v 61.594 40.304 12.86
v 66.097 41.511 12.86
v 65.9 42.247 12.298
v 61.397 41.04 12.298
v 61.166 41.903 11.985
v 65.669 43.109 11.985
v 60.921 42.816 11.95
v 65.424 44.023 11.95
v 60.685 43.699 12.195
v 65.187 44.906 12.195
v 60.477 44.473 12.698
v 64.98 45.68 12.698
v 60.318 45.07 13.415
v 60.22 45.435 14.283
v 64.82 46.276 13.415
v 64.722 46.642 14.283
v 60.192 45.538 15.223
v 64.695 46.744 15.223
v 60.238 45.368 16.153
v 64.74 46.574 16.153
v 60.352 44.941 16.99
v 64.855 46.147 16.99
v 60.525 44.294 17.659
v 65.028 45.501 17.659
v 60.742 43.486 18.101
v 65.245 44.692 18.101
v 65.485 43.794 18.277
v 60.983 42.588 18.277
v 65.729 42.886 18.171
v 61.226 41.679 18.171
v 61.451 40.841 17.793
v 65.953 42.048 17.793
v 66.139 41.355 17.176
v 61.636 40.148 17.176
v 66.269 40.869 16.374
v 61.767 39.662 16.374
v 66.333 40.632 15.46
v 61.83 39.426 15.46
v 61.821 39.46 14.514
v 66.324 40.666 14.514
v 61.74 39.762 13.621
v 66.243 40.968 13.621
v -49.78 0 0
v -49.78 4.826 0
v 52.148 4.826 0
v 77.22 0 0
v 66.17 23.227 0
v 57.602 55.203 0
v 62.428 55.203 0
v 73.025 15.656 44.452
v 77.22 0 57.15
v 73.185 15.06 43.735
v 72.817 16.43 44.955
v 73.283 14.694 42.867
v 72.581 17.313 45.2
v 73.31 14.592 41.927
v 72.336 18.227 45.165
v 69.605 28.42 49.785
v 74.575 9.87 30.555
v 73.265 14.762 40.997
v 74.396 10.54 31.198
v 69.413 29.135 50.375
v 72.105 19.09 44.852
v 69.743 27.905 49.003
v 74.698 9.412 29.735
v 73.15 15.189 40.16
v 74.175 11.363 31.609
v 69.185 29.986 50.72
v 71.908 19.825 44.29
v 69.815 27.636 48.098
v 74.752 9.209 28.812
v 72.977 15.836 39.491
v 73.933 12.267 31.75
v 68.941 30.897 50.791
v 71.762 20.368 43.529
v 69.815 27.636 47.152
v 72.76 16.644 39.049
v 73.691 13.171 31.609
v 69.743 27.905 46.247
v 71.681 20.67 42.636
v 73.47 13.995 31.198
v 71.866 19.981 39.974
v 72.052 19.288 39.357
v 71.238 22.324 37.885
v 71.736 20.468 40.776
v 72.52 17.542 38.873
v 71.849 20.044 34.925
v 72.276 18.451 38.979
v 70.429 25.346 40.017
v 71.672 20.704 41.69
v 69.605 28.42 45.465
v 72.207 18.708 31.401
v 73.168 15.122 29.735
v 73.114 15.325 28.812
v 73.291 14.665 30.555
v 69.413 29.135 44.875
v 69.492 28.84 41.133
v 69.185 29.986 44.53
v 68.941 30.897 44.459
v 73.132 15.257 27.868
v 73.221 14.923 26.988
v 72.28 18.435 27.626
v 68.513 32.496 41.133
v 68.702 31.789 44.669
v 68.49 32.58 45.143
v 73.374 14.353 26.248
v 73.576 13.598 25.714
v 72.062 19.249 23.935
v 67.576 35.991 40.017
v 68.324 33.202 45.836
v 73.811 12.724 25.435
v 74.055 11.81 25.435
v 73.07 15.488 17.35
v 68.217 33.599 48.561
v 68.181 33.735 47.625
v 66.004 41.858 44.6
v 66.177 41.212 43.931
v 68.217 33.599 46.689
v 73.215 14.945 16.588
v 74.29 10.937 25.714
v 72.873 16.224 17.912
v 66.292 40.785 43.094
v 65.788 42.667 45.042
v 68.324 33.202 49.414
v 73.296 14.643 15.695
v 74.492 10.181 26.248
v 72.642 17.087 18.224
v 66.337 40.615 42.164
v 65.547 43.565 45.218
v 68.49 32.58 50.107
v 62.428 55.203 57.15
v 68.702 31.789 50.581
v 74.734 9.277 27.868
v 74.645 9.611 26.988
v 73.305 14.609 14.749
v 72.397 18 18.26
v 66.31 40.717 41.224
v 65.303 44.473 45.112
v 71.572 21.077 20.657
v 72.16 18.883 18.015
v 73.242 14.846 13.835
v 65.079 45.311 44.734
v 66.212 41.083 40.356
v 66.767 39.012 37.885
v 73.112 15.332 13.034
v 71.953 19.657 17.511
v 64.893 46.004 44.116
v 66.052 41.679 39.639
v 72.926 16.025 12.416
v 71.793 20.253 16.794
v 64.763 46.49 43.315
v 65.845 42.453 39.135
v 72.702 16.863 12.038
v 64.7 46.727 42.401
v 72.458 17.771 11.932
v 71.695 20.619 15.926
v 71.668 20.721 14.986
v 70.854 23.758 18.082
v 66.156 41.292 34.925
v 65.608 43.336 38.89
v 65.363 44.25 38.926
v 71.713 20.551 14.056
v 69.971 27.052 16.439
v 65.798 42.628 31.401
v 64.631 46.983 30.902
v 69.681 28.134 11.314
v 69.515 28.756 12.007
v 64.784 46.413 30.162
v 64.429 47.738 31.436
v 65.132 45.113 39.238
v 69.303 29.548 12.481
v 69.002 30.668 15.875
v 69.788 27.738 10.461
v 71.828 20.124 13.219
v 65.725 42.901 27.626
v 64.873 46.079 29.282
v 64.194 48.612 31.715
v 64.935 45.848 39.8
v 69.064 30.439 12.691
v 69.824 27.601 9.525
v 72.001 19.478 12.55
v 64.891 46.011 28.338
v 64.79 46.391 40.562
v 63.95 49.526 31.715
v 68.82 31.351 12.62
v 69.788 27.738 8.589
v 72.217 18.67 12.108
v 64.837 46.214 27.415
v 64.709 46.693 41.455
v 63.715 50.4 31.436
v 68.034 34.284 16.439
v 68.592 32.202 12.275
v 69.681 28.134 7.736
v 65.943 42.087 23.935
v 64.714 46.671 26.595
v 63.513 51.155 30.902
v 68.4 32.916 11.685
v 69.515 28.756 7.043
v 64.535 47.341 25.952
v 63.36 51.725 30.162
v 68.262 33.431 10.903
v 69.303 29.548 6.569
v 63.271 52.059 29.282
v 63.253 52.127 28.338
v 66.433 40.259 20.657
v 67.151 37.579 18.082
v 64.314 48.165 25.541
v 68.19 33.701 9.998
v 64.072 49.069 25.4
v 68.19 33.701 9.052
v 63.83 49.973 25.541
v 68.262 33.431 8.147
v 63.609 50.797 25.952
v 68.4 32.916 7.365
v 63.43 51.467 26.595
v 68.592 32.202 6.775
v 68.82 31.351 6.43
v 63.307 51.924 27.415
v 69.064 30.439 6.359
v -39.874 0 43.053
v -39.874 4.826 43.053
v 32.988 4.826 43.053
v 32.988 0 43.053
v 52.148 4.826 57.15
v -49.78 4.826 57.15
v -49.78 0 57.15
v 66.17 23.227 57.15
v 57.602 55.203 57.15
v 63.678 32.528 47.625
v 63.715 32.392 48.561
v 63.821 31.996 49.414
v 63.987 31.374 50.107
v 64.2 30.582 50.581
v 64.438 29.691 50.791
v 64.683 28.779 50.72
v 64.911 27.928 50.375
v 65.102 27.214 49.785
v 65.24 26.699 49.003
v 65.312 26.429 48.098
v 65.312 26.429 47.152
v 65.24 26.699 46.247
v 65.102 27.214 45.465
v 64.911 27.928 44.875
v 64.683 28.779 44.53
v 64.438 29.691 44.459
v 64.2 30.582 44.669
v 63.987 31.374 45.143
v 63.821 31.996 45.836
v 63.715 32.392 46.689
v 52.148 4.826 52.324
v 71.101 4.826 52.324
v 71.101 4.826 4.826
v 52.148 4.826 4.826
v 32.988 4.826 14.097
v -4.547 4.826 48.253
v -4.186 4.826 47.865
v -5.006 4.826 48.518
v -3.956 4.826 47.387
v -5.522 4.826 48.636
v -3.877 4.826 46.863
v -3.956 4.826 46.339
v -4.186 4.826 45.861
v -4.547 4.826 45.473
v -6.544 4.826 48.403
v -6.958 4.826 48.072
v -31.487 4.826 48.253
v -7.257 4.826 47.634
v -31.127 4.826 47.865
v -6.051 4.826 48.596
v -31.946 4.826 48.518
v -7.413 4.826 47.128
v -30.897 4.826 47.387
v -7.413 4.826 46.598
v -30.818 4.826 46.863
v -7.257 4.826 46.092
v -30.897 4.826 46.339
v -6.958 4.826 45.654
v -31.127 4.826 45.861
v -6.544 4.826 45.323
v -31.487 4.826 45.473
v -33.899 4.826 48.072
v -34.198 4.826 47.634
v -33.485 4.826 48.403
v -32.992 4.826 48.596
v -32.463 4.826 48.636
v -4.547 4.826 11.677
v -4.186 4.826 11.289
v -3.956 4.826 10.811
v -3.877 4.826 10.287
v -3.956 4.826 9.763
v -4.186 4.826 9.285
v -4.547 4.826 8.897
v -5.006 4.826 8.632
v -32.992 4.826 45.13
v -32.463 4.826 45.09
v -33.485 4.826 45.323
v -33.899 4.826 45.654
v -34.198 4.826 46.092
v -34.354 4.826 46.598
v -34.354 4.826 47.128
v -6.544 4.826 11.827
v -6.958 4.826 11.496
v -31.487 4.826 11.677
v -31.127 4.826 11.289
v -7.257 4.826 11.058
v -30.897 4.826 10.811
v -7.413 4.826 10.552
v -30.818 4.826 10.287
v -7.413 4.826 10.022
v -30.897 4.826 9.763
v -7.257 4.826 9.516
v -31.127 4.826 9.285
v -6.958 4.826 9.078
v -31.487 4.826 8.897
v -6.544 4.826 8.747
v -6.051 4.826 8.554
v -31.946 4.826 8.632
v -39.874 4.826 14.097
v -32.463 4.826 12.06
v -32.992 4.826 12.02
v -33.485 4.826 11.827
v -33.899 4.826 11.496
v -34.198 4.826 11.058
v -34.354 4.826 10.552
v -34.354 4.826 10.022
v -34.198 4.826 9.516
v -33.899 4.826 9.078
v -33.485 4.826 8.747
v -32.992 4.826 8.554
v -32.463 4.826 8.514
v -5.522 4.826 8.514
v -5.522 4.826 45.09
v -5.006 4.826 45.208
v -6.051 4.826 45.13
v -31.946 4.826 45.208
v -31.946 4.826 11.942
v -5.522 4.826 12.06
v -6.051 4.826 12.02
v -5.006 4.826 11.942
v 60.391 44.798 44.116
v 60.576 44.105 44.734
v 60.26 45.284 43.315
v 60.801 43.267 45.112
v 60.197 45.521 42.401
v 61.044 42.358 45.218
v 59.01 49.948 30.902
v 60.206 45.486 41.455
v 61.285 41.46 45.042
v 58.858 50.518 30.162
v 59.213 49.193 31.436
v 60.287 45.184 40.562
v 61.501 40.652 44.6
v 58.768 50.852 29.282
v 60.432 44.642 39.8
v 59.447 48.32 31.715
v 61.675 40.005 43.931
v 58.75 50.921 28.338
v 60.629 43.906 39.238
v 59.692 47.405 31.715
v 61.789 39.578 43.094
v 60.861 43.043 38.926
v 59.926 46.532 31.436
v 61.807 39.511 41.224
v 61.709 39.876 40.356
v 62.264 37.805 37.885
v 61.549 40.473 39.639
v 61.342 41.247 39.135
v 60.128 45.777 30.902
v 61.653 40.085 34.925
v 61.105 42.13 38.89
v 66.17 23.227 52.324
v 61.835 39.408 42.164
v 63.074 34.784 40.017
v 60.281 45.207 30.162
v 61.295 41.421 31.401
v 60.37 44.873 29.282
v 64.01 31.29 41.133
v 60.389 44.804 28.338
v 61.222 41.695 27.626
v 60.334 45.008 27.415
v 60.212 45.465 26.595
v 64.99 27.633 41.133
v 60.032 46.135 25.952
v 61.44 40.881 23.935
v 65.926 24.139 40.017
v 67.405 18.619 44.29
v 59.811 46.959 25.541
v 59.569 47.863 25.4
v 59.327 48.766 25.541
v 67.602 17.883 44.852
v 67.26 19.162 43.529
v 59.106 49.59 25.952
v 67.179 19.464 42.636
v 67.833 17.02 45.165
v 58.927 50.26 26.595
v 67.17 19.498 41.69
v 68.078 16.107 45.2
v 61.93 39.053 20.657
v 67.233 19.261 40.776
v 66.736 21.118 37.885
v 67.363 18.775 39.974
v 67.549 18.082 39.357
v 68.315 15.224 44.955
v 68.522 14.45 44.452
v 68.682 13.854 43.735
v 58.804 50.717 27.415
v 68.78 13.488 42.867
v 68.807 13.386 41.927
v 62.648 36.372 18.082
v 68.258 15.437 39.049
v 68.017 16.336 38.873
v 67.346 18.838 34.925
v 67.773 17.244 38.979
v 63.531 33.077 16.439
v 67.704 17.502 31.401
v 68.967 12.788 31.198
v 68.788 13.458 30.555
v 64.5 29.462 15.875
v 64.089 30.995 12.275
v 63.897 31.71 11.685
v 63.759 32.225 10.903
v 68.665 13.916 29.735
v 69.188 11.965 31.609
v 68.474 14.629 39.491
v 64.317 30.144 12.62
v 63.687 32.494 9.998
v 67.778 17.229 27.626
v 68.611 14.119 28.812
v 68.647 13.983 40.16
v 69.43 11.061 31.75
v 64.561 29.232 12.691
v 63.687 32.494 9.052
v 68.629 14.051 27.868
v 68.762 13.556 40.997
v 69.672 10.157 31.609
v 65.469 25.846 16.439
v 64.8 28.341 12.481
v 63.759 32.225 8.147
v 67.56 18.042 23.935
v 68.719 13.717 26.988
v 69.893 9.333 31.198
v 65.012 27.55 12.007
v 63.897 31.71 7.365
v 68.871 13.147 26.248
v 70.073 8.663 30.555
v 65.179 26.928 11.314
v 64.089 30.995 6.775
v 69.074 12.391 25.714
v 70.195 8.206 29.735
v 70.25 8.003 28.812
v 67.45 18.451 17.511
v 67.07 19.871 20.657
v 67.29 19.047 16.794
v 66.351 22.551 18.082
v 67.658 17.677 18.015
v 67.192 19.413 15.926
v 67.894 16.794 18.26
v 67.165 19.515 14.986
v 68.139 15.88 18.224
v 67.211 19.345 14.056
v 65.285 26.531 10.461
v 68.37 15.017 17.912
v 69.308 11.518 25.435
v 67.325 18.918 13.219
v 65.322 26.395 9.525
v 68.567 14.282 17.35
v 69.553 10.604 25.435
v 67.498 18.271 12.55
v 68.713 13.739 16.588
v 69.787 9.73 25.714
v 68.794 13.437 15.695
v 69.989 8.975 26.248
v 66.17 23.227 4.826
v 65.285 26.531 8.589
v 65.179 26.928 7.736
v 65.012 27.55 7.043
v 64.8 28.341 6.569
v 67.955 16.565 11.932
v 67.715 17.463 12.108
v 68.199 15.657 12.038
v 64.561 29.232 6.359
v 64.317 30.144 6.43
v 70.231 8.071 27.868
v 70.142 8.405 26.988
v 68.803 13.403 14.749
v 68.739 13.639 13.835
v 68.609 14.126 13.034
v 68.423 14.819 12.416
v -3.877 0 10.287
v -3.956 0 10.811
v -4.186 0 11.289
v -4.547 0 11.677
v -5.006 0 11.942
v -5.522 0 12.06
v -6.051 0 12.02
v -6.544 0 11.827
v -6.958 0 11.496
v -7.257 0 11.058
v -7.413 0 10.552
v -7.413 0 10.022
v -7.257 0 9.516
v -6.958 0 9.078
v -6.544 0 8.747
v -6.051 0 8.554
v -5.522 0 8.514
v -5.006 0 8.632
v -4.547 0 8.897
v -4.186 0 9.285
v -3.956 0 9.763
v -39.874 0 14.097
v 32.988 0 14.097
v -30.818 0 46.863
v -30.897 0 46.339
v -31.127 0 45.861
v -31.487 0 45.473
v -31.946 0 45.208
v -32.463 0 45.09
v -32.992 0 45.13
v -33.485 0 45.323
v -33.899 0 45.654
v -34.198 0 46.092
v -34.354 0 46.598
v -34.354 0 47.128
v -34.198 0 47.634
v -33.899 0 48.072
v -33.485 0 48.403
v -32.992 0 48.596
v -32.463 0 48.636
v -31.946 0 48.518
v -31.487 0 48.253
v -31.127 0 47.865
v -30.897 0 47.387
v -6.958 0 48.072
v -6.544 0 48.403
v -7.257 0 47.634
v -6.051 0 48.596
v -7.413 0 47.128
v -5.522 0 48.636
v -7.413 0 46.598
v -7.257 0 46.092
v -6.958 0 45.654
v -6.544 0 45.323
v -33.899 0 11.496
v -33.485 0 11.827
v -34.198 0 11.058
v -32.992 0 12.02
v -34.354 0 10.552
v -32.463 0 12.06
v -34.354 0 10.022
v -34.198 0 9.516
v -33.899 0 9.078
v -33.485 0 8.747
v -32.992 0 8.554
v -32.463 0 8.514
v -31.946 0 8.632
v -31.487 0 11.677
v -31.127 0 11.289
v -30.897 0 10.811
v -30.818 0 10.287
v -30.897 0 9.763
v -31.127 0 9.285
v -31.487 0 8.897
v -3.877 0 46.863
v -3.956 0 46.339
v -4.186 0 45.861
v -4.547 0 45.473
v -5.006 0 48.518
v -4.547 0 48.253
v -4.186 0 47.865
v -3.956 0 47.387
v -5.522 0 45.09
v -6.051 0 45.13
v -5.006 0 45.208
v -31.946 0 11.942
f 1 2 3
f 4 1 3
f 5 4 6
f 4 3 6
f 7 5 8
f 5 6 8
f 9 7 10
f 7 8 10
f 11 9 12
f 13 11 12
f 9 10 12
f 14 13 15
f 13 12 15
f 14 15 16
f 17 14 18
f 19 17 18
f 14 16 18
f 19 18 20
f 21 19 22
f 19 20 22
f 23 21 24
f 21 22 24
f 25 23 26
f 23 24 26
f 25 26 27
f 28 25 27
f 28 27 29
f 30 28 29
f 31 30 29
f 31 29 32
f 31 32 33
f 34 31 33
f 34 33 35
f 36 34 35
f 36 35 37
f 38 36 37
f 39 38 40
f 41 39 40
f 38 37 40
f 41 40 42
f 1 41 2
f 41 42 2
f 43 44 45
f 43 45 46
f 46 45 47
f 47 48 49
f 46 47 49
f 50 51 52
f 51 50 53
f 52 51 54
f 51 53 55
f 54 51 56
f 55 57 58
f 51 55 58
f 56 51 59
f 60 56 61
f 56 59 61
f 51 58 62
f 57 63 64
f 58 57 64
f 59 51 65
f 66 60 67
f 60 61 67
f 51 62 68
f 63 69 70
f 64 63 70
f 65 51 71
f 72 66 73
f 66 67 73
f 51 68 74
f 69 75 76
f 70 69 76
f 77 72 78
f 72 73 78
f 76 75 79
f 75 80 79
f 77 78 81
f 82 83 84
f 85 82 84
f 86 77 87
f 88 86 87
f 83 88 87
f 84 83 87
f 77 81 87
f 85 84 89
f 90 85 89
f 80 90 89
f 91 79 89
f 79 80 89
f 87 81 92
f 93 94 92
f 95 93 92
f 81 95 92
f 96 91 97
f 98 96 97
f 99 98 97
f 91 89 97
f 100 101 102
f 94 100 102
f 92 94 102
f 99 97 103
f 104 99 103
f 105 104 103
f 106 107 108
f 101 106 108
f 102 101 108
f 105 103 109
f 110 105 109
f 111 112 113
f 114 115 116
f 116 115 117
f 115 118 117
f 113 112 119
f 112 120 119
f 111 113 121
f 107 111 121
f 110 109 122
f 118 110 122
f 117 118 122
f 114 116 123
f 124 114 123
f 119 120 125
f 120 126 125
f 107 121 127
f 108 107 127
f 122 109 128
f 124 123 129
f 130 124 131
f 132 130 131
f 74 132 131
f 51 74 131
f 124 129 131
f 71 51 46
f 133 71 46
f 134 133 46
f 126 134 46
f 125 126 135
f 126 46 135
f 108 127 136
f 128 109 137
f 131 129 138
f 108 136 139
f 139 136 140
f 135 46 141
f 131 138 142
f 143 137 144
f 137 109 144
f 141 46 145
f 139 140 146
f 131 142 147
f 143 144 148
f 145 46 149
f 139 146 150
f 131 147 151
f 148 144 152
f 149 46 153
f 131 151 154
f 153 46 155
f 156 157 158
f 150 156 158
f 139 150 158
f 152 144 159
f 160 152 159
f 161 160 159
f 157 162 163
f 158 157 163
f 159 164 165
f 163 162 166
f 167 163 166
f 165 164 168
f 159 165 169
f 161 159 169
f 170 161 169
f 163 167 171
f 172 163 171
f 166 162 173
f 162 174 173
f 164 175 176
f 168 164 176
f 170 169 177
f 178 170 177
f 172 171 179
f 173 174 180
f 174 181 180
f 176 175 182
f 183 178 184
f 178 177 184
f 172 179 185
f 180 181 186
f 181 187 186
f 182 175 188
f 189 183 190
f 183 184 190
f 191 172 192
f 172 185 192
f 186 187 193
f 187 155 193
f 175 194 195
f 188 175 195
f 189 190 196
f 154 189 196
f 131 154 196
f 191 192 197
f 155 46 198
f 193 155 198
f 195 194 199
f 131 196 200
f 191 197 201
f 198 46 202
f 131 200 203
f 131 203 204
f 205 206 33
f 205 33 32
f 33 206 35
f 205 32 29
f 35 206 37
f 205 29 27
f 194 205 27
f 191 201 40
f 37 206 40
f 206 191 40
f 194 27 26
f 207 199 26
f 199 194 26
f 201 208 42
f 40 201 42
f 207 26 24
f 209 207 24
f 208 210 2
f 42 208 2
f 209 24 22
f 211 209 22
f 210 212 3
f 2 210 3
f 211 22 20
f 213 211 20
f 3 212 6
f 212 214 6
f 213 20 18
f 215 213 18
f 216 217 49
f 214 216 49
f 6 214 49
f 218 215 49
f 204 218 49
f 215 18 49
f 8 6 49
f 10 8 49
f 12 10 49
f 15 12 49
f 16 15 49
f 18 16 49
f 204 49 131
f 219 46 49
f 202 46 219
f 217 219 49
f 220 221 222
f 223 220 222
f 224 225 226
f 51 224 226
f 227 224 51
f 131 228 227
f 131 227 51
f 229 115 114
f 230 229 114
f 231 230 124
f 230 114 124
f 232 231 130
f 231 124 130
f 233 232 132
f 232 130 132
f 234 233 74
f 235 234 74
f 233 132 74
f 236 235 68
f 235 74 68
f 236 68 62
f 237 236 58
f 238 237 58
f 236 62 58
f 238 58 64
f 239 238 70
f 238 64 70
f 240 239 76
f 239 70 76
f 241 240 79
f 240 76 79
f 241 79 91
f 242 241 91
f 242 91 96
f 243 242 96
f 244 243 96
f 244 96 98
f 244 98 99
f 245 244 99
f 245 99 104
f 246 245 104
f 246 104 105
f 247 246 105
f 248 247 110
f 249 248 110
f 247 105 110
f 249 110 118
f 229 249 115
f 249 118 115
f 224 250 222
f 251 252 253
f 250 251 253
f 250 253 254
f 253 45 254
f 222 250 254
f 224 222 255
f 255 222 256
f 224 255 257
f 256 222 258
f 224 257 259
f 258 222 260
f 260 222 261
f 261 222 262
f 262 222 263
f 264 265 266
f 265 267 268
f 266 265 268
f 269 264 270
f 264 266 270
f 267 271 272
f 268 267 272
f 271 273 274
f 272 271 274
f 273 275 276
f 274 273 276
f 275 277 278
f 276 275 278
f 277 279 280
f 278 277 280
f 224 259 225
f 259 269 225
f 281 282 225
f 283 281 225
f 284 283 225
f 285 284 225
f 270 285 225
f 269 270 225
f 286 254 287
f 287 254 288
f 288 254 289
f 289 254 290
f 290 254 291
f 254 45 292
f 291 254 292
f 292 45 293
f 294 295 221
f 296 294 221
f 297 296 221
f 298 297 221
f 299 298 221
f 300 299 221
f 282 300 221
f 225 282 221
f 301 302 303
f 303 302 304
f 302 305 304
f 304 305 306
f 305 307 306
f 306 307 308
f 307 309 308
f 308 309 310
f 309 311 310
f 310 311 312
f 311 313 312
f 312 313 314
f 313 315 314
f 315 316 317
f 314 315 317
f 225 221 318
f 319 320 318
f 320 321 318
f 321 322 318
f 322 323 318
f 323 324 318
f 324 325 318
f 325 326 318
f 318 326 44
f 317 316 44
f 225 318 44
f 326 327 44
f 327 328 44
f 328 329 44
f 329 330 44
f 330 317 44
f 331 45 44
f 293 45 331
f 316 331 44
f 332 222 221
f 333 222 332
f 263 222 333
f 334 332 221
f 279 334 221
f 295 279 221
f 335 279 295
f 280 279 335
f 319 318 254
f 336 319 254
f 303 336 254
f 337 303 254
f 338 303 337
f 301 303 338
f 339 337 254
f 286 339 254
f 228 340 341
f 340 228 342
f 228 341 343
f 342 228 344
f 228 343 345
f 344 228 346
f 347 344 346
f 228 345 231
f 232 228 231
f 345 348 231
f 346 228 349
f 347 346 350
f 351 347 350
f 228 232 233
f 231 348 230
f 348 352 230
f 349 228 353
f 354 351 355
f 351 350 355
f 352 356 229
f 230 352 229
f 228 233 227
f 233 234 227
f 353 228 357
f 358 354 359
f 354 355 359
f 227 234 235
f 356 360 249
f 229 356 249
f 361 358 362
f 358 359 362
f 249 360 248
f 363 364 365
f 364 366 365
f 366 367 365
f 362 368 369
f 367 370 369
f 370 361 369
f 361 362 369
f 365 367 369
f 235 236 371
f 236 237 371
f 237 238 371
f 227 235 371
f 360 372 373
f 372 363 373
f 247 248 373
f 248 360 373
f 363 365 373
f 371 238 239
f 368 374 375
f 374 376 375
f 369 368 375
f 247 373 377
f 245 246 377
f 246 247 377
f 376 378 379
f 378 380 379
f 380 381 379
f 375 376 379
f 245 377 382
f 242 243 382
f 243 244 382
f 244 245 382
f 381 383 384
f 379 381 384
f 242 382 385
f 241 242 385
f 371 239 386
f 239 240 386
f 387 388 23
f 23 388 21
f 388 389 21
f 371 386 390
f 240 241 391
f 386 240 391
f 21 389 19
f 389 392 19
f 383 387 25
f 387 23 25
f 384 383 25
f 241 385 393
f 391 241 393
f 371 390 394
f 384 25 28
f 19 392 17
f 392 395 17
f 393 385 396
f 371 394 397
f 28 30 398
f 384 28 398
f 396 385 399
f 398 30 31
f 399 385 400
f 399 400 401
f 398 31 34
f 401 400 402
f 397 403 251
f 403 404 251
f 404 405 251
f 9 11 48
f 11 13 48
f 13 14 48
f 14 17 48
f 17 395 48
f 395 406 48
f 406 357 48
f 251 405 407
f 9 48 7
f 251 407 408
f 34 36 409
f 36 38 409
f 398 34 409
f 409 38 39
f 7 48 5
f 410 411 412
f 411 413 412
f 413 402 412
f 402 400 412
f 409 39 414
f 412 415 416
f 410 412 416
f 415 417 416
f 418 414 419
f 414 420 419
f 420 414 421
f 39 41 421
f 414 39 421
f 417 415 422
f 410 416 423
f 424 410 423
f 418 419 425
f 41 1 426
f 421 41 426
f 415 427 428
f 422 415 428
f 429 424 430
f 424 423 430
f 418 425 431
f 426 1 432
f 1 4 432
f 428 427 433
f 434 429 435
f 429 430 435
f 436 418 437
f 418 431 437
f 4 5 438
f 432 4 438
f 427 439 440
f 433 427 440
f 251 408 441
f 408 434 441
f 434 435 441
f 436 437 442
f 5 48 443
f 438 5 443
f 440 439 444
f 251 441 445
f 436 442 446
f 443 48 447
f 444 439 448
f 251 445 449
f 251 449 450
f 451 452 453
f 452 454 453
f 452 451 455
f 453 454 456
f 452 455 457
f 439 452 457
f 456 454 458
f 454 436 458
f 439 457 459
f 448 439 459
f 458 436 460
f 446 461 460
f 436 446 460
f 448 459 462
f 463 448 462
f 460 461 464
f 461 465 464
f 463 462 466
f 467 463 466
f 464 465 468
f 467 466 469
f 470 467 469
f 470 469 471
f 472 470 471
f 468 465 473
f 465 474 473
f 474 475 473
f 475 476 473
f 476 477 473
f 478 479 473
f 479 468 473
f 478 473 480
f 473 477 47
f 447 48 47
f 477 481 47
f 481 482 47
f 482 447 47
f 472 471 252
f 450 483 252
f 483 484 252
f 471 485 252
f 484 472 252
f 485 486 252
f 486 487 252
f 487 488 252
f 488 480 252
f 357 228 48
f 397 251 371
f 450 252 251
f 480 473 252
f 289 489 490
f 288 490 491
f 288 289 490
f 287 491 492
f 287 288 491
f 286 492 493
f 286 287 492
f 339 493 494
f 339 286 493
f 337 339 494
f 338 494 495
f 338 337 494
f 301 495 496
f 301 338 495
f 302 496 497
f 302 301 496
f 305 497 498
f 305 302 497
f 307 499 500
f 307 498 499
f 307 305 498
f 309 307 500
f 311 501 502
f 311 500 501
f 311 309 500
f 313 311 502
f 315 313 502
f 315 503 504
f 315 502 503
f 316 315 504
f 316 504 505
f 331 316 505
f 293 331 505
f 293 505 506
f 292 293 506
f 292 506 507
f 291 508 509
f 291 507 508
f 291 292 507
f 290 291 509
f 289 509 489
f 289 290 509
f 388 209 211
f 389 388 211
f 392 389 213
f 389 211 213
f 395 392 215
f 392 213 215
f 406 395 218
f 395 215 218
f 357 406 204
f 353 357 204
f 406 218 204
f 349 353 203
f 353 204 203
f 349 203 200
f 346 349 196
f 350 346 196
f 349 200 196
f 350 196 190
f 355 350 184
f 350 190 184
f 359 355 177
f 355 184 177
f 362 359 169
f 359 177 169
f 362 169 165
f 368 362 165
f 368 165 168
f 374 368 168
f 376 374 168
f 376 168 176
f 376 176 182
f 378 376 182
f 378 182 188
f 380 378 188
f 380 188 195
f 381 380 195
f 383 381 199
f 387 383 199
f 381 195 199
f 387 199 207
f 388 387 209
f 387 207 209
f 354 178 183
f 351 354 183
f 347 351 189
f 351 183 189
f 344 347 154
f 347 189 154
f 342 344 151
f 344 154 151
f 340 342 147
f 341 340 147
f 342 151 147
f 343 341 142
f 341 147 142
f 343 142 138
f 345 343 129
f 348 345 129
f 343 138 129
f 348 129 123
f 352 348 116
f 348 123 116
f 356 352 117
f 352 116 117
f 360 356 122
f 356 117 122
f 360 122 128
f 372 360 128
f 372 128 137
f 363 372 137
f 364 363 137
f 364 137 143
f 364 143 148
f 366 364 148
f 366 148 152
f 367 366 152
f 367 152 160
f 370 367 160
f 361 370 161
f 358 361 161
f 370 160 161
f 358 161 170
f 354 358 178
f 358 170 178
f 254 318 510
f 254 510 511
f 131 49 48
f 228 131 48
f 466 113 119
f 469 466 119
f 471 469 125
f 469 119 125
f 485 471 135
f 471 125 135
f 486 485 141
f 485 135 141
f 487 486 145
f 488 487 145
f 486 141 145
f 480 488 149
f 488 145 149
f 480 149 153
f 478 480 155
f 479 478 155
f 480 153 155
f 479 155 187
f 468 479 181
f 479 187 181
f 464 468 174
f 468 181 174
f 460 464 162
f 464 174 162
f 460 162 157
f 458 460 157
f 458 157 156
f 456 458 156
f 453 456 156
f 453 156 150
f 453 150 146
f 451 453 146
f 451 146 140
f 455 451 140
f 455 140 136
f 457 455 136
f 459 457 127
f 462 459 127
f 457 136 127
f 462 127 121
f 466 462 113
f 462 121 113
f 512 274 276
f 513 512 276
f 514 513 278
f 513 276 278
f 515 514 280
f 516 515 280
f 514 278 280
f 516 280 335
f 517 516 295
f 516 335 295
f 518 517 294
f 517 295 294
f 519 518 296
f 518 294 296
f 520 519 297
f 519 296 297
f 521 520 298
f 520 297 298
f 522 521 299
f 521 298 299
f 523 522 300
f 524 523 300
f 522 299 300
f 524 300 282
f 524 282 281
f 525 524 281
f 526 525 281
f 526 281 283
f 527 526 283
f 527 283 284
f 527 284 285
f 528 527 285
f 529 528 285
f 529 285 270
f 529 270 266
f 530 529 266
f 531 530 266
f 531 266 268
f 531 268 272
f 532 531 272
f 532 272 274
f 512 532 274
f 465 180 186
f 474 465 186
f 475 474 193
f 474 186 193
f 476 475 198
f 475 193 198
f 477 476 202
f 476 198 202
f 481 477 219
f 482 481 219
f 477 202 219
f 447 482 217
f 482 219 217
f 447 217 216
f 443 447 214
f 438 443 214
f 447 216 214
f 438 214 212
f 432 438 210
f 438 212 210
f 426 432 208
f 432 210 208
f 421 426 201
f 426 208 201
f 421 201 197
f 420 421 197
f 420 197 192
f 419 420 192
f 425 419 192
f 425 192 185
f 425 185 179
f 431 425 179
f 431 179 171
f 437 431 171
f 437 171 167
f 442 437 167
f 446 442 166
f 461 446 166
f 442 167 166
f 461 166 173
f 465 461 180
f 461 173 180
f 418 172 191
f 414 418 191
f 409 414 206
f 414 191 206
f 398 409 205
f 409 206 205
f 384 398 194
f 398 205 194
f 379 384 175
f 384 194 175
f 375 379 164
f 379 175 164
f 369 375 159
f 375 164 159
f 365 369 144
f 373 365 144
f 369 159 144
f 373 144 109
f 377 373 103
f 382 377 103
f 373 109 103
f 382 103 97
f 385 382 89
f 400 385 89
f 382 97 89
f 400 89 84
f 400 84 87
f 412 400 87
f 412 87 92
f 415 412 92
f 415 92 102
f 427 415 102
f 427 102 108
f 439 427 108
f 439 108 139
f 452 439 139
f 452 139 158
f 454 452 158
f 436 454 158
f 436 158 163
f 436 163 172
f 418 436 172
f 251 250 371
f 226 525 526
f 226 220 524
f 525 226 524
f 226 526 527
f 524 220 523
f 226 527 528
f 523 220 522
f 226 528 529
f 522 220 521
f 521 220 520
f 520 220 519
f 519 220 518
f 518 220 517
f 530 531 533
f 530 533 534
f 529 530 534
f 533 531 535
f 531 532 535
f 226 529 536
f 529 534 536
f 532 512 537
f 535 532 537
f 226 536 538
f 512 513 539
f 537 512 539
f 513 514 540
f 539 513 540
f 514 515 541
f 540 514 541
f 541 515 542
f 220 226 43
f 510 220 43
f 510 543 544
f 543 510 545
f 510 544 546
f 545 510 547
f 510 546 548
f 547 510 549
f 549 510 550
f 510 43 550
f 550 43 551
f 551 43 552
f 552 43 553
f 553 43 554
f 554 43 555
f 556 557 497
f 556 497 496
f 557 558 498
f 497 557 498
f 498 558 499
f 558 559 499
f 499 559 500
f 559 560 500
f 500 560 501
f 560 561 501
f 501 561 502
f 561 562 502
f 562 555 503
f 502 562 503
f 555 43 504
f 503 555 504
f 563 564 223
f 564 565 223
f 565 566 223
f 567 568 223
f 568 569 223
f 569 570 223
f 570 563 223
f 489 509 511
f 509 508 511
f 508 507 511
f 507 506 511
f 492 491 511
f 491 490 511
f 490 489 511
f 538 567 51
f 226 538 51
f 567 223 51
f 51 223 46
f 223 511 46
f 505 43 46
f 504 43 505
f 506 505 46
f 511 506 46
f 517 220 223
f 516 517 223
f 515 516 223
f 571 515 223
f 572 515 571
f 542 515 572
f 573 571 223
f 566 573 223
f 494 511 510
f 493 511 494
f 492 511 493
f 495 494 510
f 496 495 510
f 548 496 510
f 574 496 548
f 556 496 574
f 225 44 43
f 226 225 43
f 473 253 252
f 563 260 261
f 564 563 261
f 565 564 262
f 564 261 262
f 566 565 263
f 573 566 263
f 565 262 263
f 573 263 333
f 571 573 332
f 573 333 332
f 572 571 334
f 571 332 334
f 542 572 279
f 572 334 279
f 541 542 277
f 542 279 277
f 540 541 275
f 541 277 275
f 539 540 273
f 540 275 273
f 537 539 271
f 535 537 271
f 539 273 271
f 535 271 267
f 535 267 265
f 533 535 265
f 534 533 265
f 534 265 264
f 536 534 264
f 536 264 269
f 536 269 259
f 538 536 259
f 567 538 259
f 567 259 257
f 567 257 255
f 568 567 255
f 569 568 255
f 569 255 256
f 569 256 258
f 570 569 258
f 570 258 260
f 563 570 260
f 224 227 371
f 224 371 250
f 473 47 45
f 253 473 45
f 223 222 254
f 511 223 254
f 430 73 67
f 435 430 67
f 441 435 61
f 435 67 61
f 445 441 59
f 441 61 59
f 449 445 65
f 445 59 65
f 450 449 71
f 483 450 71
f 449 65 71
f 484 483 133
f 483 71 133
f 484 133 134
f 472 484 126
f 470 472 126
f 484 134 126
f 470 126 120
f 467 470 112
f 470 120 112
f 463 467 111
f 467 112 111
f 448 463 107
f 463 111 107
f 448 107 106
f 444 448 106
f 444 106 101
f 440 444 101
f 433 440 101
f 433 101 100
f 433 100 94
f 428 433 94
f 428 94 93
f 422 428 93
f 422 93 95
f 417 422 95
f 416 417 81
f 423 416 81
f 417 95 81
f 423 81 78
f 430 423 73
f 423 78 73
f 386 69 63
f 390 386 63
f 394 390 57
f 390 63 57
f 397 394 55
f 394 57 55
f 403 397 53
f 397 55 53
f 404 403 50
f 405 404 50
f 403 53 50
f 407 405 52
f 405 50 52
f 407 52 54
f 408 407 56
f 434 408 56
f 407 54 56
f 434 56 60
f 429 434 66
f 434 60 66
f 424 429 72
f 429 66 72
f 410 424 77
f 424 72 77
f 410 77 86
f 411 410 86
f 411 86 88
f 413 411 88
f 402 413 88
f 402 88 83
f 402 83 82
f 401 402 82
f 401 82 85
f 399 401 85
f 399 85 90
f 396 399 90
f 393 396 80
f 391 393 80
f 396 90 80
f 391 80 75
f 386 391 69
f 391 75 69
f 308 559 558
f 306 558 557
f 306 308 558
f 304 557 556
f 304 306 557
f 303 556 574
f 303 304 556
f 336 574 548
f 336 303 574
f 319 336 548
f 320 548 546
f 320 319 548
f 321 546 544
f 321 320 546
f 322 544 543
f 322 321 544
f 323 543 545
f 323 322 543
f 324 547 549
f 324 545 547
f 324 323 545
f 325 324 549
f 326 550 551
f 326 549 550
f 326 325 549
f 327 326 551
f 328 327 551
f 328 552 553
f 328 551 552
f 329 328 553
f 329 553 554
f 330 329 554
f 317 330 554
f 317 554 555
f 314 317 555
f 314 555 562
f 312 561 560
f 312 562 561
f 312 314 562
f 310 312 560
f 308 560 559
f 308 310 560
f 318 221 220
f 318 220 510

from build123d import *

# Parameters (mm, degrees)
BOSS_EXTRUDE1_DEPTH = 57.15
BOSS_EXTRUDE2_DEPTH = 4.826
CUT_EXTRUDE1_REACH  = 124.673
SKETCH9_R           = 12.7
SKETCH11_R          = 3.175
CUT_EXTRUDE2_DEPTH  = 4.661558
CIRPATTERN1_COUNT   = 8
SKETCH12_R          = 1.778
SKETCH12_W          = 72.86244
SKETCH12_H          = 28.956
CUT_EXTRUDE4_DEPTH  = 5.826


with BuildPart() as part:
    # Sketch3 → Boss-Extrude1 (new body)
    with BuildSketch(Plane.XY):
        Polygon((-49.78, 0), (77.22, 0), (62.428491572, 55.202660972), (57.602491572, 55.202660972), (71.100877197, 4.826), (-49.78, 4.826), align=None)
    extrude(amount=BOSS_EXTRUDE1_DEPTH)

    # Sketch5 → Boss-Extrude2 (add)
    with BuildSketch(Plane.XY.offset(57.15)):
        Polygon((52.148255035, 4.826), (71.100877197, 4.826), (66.170374388, 23.226886991), align=None)
    boss_extrude2 = extrude(amount=-BOSS_EXTRUDE2_DEPTH)

    # Mirror1: Boss-Extrude2 across plane
    add(boss_extrude2.mirror(Plane(origin=(0, 0, 28.575), x_dir=(1, 0, 0), z_dir=(0, 0, -1))))

    # Sketch9 → Cut-Extrude1 (cut, up to next)
    with BuildSketch(Plane(origin=(72.04724084, 19.305, 0), x_dir=(0, 0, -1), z_dir=(0.965925826, 0.258819045, 0)), mode=Mode.PRIVATE) as cut_extrude1_sk1:
        with Locations((-28.575, 11.763993337)):
            Circle(SKETCH9_R)
    cut_extrude1_tool1 = extrude(cut_extrude1_sk1.sketch, amount=-CUT_EXTRUDE1_REACH, mode=Mode.PRIVATE) & part.part
    add(cut_extrude1_tool1.solids().sort_by_distance((69.002495, 30.668145, 28.575))[0], mode=Mode.SUBTRACT)

    # Sketch11 → Cut-Extrude2 (cut)
    with BuildSketch(Plane(origin=(72.04724084, 19.305, 0), x_dir=(0, 0, -1), z_dir=(0.965925826, 0.258819045, 0))):
        with Locations((-28.575, 30.813993337)):
            Circle(SKETCH11_R)
    cut_extrude2 = extrude(amount=-CUT_EXTRUDE2_DEPTH, mode=Mode.SUBTRACT)

    # CirPattern1: Cut-Extrude2 ×8 about axis
    cirpattern1_axis = Axis((-3.044745522, 11.363144985, 28.575), (0.965925826, 0.258819045, 0))
    for i in range(1, CIRPATTERN1_COUNT):
        add(cut_extrude2.rotate(cirpattern1_axis, i * 360 / CIRPATTERN1_COUNT), mode=Mode.SUBTRACT)

    # Sketch12 → Cut-Extrude4 (cut, through all)
    with BuildSketch(Plane(origin=(0, 4.826, 0), x_dir=(1, 0, 0), z_dir=(0, 1, 0))):
        with Locations((-32.595884, -46.863)):
            Circle(SKETCH12_R)
        with Locations((-5.65512, -46.863)):
            Circle(SKETCH12_R)
        with Locations((-3.44278, -28.575)):
            Rectangle(SKETCH12_W, SKETCH12_H)
    cut_extrude4 = extrude(amount=-CUT_EXTRUDE4_DEPTH, mode=Mode.SUBTRACT)

    # Mirror4: Cut-Extrude4 across plane
    add(cut_extrude4.mirror(Plane(origin=(0, 0, 28.575), x_dir=(1, 0, 0), z_dir=(0, 0, -1))), mode=Mode.SUBTRACT)


solid = part.part
